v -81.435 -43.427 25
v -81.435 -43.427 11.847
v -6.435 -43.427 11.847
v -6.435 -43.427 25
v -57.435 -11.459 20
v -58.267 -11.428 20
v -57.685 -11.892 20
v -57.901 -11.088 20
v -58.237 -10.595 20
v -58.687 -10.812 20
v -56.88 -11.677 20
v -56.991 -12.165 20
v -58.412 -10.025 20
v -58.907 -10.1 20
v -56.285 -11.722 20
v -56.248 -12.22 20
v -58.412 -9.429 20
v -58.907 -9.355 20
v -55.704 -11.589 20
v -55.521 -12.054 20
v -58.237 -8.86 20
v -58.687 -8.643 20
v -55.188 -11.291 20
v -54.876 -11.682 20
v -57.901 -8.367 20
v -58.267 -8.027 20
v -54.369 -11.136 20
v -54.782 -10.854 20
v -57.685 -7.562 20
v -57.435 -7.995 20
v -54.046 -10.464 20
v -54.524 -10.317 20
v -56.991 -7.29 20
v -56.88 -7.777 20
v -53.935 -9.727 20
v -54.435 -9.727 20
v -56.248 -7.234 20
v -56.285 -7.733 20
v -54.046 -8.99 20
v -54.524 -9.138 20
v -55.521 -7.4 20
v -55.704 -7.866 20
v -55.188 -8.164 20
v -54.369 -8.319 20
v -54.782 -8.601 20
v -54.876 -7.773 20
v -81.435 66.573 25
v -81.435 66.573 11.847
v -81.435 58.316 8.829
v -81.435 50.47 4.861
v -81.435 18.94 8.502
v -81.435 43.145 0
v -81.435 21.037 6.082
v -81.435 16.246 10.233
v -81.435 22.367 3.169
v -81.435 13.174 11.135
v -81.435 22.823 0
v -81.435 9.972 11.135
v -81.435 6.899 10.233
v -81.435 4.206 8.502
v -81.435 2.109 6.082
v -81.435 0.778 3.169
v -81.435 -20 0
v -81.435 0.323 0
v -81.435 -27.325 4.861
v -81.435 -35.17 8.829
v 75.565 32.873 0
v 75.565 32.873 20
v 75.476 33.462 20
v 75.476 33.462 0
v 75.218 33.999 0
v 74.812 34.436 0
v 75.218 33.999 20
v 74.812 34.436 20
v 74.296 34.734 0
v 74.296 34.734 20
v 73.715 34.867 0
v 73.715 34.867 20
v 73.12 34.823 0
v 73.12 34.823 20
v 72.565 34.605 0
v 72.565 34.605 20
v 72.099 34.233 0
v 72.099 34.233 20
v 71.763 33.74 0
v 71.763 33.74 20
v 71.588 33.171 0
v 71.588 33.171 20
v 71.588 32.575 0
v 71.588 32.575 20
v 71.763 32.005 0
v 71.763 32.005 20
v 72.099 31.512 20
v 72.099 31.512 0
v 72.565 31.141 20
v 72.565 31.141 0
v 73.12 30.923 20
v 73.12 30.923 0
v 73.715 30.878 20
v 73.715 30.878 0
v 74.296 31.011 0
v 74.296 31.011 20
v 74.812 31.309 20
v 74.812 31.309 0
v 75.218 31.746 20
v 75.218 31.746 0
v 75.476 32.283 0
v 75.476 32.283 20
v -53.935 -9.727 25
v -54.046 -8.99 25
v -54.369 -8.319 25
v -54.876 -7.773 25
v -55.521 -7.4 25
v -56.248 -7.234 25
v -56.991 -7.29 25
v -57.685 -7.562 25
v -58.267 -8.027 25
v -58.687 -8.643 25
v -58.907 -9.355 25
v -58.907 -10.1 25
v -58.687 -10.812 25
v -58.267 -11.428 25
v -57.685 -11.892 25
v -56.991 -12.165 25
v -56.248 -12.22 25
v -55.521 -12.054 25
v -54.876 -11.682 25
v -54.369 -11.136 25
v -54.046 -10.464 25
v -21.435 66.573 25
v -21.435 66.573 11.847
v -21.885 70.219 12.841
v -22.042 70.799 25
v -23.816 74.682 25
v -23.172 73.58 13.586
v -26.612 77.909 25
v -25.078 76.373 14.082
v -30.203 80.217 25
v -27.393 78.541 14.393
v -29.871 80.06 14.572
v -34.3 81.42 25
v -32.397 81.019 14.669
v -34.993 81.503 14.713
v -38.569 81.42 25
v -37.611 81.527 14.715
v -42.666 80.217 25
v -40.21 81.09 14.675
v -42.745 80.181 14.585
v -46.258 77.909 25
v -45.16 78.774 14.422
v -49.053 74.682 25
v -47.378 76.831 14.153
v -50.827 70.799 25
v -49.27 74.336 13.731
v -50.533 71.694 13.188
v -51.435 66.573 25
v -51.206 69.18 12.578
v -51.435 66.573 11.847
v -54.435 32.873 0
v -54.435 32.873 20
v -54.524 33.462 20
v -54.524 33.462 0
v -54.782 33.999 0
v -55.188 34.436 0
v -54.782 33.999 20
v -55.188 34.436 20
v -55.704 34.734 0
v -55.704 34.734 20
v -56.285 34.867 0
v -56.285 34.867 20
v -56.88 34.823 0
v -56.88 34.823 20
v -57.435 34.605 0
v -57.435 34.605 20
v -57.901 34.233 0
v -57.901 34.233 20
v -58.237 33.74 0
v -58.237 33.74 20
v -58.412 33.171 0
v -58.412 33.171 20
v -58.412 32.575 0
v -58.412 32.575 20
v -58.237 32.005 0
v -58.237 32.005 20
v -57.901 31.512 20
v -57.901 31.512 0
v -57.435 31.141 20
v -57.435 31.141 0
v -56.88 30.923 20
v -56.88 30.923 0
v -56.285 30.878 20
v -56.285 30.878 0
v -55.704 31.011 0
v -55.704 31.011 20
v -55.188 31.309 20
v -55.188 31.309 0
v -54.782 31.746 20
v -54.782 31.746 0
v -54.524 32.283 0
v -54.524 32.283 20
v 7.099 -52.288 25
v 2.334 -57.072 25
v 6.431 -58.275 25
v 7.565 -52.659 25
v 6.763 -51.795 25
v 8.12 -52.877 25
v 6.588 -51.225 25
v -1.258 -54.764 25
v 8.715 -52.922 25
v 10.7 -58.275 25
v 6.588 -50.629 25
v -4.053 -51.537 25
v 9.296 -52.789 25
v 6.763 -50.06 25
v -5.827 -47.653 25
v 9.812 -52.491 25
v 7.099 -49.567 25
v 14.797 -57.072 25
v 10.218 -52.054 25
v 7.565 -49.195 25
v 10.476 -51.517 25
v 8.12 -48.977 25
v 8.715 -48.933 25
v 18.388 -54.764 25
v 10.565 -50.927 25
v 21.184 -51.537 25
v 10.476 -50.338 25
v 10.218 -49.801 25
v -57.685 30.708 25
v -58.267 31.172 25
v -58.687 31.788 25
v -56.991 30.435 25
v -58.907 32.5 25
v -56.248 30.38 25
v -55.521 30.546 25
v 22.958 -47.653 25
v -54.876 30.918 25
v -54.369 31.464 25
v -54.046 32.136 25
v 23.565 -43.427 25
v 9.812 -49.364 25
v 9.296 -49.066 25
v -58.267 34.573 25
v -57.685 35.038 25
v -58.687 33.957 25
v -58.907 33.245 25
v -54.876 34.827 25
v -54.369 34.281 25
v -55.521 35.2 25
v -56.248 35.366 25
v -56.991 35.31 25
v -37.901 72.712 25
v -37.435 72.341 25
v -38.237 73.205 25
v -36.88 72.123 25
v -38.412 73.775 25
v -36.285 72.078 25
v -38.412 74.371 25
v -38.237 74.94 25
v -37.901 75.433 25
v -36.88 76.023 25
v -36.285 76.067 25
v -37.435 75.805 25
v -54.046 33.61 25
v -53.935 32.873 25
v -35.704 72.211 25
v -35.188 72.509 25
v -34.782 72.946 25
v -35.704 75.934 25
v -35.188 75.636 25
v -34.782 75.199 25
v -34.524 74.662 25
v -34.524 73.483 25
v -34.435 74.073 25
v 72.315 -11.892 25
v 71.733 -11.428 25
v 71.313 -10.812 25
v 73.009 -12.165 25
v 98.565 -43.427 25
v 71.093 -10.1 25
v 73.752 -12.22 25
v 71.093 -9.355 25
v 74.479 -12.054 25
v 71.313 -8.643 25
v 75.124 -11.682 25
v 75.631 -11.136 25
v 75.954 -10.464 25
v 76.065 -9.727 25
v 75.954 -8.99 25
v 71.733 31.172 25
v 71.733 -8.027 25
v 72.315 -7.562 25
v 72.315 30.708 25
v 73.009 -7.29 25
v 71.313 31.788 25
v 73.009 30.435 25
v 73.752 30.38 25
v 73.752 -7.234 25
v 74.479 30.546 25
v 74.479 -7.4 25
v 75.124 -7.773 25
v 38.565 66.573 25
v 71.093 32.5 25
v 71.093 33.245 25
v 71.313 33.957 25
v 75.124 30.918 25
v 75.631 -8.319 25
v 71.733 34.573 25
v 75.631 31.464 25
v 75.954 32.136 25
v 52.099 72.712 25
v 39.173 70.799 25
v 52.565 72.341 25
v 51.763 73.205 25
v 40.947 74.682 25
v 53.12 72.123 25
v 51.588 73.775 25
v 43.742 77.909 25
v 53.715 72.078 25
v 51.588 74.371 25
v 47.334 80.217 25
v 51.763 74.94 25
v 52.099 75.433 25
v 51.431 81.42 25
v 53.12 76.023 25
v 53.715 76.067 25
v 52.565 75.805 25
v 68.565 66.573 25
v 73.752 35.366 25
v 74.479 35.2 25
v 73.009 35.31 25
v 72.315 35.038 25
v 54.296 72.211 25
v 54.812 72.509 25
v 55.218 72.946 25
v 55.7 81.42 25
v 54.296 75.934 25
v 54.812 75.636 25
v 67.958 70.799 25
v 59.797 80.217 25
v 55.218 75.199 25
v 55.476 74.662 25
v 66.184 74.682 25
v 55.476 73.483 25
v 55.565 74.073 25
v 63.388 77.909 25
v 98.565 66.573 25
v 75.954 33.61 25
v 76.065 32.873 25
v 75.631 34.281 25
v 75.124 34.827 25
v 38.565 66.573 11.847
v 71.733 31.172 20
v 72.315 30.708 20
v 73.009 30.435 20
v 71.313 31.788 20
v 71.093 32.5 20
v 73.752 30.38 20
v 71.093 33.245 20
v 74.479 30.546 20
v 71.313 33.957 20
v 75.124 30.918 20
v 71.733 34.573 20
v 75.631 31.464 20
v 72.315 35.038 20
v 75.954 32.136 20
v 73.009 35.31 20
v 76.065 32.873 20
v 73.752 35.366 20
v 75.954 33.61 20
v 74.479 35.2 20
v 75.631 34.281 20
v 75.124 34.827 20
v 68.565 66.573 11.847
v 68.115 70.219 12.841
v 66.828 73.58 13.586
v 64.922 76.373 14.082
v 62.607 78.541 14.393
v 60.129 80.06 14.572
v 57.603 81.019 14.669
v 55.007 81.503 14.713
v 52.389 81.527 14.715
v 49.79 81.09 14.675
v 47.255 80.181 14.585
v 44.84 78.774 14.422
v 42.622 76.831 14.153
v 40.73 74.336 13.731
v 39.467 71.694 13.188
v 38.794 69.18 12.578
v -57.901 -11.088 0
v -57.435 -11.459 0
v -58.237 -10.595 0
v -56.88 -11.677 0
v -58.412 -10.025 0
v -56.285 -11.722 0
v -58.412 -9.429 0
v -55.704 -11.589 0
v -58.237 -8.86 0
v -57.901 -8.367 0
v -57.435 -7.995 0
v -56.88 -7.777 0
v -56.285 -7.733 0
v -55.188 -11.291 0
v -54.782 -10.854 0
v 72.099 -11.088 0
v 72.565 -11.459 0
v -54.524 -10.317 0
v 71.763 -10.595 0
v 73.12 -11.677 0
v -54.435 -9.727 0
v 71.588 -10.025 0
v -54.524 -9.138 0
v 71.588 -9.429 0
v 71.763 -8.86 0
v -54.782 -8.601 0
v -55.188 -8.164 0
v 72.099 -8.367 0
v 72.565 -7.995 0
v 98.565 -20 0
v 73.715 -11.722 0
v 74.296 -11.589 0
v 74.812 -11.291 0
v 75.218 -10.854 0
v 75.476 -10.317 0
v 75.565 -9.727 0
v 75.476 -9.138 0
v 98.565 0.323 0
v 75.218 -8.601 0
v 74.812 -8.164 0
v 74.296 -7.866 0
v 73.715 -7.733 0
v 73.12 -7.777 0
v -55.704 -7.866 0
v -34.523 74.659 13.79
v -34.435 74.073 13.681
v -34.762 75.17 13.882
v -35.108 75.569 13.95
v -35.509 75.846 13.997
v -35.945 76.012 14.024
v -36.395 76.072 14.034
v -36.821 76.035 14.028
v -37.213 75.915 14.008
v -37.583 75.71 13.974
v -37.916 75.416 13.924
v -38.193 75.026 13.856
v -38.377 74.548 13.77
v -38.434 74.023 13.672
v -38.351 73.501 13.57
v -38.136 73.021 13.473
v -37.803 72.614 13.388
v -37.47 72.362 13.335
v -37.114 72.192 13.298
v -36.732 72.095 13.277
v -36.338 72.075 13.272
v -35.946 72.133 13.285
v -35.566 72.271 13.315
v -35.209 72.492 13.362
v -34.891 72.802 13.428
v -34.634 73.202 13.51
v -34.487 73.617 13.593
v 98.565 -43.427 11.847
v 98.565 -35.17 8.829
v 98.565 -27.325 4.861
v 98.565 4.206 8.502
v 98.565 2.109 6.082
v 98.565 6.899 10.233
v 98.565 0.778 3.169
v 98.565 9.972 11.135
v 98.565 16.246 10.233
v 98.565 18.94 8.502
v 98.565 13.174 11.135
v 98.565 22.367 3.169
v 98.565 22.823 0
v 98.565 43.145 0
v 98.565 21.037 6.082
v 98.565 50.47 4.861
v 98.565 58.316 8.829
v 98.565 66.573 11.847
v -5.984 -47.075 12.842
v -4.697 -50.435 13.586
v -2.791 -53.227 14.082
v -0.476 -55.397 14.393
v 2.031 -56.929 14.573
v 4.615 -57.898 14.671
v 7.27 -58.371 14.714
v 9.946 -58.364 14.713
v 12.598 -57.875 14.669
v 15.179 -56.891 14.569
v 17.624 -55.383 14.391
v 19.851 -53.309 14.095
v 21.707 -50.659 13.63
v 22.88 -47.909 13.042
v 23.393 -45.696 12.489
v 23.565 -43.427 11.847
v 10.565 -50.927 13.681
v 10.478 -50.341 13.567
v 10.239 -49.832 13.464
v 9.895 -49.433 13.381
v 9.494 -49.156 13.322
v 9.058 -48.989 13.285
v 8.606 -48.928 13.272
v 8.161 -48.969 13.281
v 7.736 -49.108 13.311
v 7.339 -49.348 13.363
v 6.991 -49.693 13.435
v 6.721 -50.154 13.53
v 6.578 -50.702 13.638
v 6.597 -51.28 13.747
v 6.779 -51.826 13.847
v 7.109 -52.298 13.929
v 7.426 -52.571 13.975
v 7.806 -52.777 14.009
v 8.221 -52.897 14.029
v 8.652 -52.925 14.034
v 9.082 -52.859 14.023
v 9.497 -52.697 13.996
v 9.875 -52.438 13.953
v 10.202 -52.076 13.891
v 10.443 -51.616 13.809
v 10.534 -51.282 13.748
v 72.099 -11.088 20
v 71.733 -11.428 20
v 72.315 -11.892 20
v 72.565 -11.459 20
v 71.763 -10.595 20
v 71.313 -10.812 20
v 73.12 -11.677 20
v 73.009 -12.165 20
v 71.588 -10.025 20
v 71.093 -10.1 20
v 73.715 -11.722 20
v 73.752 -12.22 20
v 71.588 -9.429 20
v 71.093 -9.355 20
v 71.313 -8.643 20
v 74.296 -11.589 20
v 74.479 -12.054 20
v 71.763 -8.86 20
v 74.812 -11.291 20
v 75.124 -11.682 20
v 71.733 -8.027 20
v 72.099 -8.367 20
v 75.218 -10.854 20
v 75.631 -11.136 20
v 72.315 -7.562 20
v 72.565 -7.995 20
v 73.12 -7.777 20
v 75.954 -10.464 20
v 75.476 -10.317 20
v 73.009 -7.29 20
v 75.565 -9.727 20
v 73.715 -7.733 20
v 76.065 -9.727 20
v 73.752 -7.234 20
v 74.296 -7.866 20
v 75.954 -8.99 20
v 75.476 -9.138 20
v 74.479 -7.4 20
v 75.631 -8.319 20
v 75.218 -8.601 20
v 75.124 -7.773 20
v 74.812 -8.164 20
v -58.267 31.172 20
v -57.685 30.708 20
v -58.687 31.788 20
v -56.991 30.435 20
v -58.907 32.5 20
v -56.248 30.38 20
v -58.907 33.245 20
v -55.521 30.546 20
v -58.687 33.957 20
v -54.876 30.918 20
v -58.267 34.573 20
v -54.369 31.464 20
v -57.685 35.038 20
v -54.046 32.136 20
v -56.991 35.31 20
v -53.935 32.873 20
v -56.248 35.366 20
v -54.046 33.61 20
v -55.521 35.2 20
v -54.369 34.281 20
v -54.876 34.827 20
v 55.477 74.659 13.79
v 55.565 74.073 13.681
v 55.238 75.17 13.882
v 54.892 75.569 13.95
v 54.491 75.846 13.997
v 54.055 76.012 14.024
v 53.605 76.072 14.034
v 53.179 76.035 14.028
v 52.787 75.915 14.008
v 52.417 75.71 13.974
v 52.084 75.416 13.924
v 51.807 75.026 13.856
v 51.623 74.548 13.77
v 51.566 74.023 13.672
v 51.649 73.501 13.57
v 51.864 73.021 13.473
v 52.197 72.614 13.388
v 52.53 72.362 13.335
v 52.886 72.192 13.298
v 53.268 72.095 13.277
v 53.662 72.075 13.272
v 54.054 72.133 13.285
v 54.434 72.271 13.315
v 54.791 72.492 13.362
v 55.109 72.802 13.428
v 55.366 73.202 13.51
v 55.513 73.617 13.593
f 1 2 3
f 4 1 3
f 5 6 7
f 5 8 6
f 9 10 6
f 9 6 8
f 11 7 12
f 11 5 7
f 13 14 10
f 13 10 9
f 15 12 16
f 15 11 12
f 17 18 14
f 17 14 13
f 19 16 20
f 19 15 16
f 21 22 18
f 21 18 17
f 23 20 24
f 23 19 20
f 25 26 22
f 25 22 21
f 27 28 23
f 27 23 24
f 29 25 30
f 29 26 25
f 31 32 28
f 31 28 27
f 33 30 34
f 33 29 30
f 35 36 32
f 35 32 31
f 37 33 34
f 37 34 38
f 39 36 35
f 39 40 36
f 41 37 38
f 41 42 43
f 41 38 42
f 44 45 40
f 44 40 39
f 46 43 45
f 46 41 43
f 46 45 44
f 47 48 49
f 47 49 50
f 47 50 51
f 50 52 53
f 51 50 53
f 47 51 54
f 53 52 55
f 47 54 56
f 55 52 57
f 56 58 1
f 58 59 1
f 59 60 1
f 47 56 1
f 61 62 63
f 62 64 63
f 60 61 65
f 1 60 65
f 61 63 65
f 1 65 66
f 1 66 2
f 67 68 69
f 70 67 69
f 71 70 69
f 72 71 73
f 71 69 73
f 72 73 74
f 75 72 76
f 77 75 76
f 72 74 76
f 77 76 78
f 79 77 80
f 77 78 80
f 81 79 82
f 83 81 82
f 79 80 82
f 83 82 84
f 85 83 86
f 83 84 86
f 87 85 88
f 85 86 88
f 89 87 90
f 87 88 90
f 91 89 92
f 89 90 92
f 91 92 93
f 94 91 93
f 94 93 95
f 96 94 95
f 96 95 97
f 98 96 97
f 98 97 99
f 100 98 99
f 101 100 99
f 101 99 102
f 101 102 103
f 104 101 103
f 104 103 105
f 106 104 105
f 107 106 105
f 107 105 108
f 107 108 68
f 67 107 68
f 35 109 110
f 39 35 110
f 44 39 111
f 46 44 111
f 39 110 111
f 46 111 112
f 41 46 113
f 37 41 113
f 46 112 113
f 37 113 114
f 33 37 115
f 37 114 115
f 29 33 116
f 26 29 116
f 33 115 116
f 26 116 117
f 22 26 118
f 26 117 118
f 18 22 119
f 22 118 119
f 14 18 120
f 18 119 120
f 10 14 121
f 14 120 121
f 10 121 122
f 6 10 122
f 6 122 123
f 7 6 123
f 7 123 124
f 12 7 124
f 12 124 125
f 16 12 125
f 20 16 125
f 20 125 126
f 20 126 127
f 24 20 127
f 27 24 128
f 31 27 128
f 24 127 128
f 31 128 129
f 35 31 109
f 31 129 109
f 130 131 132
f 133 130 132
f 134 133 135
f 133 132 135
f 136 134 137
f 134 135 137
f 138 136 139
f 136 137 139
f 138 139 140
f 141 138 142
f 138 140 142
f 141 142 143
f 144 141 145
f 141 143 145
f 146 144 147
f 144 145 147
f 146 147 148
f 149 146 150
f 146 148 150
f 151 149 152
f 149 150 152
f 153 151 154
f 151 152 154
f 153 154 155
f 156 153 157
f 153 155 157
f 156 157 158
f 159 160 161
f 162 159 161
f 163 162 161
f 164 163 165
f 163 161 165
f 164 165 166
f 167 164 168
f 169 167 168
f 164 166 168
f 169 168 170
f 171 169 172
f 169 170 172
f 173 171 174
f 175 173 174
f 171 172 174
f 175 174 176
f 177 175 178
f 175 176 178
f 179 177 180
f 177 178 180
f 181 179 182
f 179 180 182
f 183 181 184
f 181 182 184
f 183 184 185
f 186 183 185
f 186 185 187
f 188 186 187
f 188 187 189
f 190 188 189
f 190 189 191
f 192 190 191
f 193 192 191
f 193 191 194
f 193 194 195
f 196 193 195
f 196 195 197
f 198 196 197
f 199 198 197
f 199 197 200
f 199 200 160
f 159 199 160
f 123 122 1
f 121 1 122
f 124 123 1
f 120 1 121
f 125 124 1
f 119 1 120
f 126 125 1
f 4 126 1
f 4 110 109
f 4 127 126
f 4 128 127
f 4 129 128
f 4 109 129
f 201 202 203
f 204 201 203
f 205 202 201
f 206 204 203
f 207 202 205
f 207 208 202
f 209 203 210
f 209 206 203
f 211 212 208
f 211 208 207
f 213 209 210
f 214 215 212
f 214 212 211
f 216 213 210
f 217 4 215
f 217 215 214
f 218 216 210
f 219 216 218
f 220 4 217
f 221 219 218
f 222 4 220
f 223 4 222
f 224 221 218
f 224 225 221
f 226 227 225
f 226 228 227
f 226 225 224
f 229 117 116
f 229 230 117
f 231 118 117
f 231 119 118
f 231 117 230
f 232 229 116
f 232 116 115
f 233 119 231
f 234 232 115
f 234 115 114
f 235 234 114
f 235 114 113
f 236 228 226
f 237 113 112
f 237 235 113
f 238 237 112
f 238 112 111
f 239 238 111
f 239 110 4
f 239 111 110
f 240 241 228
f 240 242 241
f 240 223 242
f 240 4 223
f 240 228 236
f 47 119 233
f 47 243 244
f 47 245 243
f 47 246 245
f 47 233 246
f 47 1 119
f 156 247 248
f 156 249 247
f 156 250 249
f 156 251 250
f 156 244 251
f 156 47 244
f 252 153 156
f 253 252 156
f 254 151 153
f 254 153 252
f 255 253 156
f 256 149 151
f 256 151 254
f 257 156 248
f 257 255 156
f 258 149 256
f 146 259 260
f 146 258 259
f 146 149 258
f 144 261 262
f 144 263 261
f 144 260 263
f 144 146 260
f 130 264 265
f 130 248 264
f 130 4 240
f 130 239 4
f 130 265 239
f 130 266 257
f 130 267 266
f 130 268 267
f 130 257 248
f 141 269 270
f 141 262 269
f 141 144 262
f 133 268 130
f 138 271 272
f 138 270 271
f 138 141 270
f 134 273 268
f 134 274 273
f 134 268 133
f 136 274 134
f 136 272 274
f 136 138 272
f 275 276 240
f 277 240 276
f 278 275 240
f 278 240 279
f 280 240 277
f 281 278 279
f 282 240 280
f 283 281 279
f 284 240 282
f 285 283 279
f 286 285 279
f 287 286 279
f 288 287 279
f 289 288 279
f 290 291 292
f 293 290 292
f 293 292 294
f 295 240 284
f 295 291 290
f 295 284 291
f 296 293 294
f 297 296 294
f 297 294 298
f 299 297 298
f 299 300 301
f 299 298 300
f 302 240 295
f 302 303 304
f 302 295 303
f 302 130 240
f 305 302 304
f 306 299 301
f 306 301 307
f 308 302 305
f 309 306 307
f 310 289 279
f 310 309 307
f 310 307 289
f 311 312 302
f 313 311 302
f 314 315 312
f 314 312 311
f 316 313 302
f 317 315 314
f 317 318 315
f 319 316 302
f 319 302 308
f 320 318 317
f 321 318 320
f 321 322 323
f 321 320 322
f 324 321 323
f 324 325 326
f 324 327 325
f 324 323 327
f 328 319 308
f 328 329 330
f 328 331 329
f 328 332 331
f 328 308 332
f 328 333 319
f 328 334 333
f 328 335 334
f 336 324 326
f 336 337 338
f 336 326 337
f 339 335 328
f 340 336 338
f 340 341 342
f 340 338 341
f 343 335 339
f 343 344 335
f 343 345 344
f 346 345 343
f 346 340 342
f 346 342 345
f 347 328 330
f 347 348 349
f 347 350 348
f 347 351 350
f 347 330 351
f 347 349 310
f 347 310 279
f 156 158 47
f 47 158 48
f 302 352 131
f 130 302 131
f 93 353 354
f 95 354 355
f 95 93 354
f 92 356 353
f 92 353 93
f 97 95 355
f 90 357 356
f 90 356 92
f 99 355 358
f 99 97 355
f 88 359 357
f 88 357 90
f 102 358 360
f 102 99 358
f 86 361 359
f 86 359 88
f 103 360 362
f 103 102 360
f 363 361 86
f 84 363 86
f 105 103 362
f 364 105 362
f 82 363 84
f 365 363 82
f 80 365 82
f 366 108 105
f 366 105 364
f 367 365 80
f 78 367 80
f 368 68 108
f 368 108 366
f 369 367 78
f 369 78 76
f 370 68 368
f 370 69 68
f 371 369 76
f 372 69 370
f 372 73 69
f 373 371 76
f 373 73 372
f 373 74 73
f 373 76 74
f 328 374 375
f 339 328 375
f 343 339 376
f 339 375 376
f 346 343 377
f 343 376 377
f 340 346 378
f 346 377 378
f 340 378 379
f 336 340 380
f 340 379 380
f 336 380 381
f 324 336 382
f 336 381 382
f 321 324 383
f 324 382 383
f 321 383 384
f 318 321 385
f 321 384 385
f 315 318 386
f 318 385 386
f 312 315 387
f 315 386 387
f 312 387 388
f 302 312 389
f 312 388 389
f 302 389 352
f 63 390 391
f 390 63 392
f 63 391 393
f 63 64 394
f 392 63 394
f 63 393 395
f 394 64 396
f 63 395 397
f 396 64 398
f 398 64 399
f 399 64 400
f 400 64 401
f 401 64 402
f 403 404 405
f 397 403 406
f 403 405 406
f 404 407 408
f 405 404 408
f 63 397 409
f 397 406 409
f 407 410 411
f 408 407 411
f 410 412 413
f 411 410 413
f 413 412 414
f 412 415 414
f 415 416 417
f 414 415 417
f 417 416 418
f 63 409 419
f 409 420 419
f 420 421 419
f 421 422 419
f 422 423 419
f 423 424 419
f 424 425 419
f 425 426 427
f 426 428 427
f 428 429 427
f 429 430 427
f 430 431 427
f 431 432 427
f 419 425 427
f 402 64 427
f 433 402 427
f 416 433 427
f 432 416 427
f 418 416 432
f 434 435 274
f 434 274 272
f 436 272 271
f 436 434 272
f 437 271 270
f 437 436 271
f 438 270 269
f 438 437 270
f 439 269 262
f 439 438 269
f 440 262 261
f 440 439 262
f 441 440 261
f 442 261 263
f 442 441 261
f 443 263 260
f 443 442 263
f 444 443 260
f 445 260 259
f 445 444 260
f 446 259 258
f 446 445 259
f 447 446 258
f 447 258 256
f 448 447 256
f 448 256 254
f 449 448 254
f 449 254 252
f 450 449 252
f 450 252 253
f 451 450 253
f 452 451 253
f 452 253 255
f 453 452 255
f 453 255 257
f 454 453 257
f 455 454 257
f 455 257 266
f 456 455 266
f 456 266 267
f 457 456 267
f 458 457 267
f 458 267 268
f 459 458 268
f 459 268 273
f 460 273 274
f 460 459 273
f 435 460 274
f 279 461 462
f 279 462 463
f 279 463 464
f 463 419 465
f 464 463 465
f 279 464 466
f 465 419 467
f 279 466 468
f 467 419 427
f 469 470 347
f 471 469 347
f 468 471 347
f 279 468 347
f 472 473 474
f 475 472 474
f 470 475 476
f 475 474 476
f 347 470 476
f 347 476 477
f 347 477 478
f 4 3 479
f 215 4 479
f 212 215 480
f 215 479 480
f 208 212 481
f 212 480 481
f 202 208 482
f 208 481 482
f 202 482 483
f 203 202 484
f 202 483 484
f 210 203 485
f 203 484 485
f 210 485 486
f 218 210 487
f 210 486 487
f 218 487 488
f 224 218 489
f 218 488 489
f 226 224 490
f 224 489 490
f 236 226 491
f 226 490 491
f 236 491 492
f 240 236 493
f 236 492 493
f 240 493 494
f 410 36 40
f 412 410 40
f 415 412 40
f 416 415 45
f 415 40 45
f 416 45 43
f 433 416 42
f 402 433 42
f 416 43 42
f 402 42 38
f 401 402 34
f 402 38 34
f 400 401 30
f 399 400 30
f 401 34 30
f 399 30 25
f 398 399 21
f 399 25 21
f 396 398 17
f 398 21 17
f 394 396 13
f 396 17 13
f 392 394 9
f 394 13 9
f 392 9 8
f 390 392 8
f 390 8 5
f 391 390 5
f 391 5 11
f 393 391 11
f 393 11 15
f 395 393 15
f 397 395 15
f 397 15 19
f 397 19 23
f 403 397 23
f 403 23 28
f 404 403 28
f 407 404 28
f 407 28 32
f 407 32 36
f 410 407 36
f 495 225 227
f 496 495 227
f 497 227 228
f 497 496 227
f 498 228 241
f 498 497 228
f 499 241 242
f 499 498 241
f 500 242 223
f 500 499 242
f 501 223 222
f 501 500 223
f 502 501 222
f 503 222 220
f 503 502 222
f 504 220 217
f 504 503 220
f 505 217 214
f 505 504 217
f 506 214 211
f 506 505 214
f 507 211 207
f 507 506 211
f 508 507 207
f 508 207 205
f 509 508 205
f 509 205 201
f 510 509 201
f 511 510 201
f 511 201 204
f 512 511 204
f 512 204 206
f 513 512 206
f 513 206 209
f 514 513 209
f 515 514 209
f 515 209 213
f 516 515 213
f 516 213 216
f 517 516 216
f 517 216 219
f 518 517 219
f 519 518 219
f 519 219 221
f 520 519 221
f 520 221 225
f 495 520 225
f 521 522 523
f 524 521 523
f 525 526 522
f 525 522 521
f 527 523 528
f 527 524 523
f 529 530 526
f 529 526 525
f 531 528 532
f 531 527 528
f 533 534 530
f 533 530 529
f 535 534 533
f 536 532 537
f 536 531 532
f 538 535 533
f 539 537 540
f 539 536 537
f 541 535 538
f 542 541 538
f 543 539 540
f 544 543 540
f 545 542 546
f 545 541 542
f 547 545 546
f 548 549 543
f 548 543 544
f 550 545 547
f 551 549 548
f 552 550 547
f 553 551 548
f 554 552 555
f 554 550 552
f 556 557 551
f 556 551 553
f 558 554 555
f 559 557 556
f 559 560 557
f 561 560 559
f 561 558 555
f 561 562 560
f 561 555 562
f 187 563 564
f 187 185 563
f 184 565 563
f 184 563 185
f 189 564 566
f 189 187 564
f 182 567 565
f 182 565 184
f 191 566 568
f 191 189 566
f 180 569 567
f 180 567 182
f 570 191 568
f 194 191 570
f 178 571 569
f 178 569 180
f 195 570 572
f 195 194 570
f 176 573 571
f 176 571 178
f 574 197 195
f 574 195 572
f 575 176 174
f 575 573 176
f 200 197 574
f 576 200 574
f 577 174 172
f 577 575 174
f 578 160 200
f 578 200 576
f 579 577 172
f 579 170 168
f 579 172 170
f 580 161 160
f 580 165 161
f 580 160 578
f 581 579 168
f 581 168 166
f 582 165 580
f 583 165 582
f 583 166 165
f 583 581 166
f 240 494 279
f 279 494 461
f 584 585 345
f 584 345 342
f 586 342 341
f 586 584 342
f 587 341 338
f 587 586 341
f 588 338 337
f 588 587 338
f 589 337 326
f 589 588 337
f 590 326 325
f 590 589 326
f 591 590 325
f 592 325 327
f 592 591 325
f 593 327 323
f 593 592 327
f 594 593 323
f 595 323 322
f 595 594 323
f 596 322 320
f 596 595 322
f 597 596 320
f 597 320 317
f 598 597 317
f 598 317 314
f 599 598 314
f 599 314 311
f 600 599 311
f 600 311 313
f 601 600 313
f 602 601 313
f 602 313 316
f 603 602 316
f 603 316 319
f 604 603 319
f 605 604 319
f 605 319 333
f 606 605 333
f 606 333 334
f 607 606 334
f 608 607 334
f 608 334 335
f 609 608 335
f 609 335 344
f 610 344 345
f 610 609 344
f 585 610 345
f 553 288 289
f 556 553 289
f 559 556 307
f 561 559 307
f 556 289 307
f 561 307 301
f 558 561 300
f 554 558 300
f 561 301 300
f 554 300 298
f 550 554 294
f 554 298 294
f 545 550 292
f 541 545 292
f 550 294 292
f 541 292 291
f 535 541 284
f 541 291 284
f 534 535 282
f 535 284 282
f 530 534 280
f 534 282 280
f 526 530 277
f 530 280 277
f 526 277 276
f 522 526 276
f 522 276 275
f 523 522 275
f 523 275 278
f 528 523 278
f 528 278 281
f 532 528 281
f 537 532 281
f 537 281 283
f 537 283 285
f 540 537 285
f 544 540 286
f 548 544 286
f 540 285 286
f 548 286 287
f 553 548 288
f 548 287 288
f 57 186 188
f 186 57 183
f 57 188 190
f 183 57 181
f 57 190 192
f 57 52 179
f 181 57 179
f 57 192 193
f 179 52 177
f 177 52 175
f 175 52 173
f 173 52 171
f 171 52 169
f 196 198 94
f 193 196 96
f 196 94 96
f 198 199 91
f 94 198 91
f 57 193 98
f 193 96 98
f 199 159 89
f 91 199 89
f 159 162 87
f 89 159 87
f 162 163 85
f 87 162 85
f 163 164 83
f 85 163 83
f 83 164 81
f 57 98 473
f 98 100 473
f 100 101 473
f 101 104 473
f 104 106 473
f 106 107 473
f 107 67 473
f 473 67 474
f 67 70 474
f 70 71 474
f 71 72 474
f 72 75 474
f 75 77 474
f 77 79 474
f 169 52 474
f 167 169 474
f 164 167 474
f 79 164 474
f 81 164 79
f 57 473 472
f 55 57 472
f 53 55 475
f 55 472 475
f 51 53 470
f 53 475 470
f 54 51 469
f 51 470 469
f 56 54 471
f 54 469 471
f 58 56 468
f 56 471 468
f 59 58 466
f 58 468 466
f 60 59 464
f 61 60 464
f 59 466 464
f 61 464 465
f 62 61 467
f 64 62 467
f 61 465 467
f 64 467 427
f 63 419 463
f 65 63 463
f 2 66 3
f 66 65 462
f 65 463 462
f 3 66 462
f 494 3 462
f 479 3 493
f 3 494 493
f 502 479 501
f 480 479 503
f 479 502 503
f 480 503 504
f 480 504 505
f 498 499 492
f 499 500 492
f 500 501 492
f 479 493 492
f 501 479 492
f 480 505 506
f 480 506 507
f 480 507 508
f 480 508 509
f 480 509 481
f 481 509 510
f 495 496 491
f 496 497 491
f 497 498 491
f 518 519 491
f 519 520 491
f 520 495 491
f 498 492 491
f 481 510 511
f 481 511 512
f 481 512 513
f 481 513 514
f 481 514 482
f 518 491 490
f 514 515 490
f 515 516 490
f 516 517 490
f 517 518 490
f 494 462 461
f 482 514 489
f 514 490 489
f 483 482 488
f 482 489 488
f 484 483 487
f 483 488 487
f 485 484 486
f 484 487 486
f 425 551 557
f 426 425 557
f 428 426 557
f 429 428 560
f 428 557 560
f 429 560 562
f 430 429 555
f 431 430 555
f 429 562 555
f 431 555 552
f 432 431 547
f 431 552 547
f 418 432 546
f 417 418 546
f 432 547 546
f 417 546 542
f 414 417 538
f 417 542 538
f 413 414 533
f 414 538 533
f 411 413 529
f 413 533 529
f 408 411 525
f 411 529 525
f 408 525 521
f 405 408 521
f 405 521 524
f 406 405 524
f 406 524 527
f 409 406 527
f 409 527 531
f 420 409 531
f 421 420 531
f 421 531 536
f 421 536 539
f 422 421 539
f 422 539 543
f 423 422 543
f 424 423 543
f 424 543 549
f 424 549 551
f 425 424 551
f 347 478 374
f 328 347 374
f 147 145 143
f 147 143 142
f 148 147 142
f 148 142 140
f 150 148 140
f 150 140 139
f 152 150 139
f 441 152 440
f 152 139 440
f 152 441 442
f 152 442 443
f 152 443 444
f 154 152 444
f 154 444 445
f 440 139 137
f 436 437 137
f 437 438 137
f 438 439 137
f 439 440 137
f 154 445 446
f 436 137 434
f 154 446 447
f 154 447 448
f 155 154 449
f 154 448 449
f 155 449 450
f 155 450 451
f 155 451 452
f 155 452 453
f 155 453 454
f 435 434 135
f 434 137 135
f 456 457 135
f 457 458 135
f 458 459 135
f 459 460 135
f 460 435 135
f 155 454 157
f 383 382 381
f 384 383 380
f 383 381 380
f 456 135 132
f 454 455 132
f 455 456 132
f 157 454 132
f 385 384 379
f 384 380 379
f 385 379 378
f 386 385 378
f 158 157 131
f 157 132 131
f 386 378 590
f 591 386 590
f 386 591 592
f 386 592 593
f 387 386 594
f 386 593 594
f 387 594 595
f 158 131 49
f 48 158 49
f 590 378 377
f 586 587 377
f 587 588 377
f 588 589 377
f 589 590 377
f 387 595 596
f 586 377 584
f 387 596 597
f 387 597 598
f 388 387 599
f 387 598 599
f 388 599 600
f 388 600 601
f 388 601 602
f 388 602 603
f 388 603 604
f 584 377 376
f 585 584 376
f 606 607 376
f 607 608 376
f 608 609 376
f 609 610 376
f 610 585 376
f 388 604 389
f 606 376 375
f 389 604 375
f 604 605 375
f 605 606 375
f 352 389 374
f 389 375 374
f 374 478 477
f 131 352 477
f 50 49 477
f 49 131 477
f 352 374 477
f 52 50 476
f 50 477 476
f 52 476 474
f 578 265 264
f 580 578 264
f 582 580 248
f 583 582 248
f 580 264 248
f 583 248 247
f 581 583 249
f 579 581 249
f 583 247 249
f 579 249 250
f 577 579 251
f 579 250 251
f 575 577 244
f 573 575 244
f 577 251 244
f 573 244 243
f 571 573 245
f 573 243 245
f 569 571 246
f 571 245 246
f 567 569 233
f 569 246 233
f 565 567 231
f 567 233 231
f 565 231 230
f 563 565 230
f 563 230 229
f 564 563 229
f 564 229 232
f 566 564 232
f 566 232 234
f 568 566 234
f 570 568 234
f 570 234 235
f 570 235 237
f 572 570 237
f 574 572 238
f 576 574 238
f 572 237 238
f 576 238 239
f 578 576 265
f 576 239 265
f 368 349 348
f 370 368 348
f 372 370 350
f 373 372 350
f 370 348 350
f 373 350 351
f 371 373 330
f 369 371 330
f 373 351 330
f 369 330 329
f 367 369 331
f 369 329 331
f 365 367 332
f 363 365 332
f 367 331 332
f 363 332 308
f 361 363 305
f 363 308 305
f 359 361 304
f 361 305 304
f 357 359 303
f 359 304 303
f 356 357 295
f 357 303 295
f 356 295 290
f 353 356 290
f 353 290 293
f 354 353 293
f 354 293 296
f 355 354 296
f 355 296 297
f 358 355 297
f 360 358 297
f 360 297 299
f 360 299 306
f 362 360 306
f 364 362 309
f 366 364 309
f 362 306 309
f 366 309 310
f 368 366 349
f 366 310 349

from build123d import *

# Parameters (mm, degrees)
F0_R     = 2
F1_DEPTH = 25
F3_DEPTH = 276
F4_R     = 2
F5_DEPTH = 84.8
F6_R     = 2.5
F7_DEPTH = 5


with BuildPart() as f1:
    # F0 (on Top) → F1 (new body)
    with BuildSketch(Plane.XY):
        with BuildLine():
            Line((-51.434658, 66.572686), (-81.434658, 66.572686))
            Line((-81.434658, 66.572686), (-81.434658, -43.427314))
            Line((-81.434658, -43.427314), (-6.434658, -43.427314))
            ThreePointArc((-6.434658, -43.427314), (8.565342, -58.427314), (23.565342, -43.427314))
            Line((23.565342, -43.427314), (98.565342, -43.427314))
            Line((98.565342, -43.427314), (98.565342, 66.572686))
            Line((98.565342, 66.572686), (68.565342, 66.572686))
            ThreePointArc((68.565342, 66.572686), (53.565342, 81.572686), (38.565342, 66.572686))
            Line((38.565342, 66.572686), (-21.434658, 66.572686))
            ThreePointArc((-21.434658, 66.572686), (-36.434658, 81.572686), (-51.434658, 66.572686))
        make_face()
        with Locations((8.565342, -50.927314)):
            Circle(F0_R, mode=Mode.SUBTRACT)
        with Locations((-36.434658, 74.072686)):
            Circle(F0_R, mode=Mode.SUBTRACT)
        with Locations((53.565342, 74.072686)):
            Circle(F0_R, mode=Mode.SUBTRACT)
    extrude(amount=F1_DEPTH)

    # F2 (on face) → F3 (cut)
    with BuildSketch(Plane.YZ.offset(98.565342)):
        with BuildLine():
            Line((43.145373, 0), (22.822686, 0))
            ThreePointArc((22.822686, 0), (11.572686, 11.25), (0.322686, 0))
            Line((0.322686, 0), (-20, 0))
            ThreePointArc((-20, 0), (-41.231841, 11.150842), (-64.902842, 15))
            Line((-64.902842, 15), (-64.902842, -16.413443))
            Line((-64.902842, -16.413443), (88.048215, -16.413443))
            Line((88.048215, -16.413443), (88.048215, 15))
            ThreePointArc((88.048215, 15), (64.377213, 11.150842), (43.145373, 0))
        make_face()
    extrude(amount=-F3_DEPTH, mode=Mode.SUBTRACT)

    # F4 (on face) → F5 (cut)
    with BuildSketch(Plane.XY.offset(25)):
        with Locations((-56.434658, 32.872686)):
            Circle(F4_R)
        with Locations((73.565342, 32.872686)):
            Circle(F4_R)
        with Locations((-56.434658, -9.727314)):
            Circle(F4_R)
        with Locations((73.565342, -9.727314)):
            Circle(F4_R)
    extrude(amount=-F5_DEPTH, mode=Mode.SUBTRACT)

    # F6 (on face) → F7 (cut)
    with BuildSketch(Plane.XY.offset(25)):
        with Locations((-56.434658, 32.872686)):
            Circle(F6_R)
        with Locations((73.565342, 32.872686)):
            Circle(F6_R)
        with Locations((73.565342, -9.727314)):
            Circle(F6_R)
        with Locations((-56.434658, -9.727314)):
            Circle(F6_R)
    extrude(amount=-F7_DEPTH, mode=Mode.SUBTRACT)


solid = f1.part
